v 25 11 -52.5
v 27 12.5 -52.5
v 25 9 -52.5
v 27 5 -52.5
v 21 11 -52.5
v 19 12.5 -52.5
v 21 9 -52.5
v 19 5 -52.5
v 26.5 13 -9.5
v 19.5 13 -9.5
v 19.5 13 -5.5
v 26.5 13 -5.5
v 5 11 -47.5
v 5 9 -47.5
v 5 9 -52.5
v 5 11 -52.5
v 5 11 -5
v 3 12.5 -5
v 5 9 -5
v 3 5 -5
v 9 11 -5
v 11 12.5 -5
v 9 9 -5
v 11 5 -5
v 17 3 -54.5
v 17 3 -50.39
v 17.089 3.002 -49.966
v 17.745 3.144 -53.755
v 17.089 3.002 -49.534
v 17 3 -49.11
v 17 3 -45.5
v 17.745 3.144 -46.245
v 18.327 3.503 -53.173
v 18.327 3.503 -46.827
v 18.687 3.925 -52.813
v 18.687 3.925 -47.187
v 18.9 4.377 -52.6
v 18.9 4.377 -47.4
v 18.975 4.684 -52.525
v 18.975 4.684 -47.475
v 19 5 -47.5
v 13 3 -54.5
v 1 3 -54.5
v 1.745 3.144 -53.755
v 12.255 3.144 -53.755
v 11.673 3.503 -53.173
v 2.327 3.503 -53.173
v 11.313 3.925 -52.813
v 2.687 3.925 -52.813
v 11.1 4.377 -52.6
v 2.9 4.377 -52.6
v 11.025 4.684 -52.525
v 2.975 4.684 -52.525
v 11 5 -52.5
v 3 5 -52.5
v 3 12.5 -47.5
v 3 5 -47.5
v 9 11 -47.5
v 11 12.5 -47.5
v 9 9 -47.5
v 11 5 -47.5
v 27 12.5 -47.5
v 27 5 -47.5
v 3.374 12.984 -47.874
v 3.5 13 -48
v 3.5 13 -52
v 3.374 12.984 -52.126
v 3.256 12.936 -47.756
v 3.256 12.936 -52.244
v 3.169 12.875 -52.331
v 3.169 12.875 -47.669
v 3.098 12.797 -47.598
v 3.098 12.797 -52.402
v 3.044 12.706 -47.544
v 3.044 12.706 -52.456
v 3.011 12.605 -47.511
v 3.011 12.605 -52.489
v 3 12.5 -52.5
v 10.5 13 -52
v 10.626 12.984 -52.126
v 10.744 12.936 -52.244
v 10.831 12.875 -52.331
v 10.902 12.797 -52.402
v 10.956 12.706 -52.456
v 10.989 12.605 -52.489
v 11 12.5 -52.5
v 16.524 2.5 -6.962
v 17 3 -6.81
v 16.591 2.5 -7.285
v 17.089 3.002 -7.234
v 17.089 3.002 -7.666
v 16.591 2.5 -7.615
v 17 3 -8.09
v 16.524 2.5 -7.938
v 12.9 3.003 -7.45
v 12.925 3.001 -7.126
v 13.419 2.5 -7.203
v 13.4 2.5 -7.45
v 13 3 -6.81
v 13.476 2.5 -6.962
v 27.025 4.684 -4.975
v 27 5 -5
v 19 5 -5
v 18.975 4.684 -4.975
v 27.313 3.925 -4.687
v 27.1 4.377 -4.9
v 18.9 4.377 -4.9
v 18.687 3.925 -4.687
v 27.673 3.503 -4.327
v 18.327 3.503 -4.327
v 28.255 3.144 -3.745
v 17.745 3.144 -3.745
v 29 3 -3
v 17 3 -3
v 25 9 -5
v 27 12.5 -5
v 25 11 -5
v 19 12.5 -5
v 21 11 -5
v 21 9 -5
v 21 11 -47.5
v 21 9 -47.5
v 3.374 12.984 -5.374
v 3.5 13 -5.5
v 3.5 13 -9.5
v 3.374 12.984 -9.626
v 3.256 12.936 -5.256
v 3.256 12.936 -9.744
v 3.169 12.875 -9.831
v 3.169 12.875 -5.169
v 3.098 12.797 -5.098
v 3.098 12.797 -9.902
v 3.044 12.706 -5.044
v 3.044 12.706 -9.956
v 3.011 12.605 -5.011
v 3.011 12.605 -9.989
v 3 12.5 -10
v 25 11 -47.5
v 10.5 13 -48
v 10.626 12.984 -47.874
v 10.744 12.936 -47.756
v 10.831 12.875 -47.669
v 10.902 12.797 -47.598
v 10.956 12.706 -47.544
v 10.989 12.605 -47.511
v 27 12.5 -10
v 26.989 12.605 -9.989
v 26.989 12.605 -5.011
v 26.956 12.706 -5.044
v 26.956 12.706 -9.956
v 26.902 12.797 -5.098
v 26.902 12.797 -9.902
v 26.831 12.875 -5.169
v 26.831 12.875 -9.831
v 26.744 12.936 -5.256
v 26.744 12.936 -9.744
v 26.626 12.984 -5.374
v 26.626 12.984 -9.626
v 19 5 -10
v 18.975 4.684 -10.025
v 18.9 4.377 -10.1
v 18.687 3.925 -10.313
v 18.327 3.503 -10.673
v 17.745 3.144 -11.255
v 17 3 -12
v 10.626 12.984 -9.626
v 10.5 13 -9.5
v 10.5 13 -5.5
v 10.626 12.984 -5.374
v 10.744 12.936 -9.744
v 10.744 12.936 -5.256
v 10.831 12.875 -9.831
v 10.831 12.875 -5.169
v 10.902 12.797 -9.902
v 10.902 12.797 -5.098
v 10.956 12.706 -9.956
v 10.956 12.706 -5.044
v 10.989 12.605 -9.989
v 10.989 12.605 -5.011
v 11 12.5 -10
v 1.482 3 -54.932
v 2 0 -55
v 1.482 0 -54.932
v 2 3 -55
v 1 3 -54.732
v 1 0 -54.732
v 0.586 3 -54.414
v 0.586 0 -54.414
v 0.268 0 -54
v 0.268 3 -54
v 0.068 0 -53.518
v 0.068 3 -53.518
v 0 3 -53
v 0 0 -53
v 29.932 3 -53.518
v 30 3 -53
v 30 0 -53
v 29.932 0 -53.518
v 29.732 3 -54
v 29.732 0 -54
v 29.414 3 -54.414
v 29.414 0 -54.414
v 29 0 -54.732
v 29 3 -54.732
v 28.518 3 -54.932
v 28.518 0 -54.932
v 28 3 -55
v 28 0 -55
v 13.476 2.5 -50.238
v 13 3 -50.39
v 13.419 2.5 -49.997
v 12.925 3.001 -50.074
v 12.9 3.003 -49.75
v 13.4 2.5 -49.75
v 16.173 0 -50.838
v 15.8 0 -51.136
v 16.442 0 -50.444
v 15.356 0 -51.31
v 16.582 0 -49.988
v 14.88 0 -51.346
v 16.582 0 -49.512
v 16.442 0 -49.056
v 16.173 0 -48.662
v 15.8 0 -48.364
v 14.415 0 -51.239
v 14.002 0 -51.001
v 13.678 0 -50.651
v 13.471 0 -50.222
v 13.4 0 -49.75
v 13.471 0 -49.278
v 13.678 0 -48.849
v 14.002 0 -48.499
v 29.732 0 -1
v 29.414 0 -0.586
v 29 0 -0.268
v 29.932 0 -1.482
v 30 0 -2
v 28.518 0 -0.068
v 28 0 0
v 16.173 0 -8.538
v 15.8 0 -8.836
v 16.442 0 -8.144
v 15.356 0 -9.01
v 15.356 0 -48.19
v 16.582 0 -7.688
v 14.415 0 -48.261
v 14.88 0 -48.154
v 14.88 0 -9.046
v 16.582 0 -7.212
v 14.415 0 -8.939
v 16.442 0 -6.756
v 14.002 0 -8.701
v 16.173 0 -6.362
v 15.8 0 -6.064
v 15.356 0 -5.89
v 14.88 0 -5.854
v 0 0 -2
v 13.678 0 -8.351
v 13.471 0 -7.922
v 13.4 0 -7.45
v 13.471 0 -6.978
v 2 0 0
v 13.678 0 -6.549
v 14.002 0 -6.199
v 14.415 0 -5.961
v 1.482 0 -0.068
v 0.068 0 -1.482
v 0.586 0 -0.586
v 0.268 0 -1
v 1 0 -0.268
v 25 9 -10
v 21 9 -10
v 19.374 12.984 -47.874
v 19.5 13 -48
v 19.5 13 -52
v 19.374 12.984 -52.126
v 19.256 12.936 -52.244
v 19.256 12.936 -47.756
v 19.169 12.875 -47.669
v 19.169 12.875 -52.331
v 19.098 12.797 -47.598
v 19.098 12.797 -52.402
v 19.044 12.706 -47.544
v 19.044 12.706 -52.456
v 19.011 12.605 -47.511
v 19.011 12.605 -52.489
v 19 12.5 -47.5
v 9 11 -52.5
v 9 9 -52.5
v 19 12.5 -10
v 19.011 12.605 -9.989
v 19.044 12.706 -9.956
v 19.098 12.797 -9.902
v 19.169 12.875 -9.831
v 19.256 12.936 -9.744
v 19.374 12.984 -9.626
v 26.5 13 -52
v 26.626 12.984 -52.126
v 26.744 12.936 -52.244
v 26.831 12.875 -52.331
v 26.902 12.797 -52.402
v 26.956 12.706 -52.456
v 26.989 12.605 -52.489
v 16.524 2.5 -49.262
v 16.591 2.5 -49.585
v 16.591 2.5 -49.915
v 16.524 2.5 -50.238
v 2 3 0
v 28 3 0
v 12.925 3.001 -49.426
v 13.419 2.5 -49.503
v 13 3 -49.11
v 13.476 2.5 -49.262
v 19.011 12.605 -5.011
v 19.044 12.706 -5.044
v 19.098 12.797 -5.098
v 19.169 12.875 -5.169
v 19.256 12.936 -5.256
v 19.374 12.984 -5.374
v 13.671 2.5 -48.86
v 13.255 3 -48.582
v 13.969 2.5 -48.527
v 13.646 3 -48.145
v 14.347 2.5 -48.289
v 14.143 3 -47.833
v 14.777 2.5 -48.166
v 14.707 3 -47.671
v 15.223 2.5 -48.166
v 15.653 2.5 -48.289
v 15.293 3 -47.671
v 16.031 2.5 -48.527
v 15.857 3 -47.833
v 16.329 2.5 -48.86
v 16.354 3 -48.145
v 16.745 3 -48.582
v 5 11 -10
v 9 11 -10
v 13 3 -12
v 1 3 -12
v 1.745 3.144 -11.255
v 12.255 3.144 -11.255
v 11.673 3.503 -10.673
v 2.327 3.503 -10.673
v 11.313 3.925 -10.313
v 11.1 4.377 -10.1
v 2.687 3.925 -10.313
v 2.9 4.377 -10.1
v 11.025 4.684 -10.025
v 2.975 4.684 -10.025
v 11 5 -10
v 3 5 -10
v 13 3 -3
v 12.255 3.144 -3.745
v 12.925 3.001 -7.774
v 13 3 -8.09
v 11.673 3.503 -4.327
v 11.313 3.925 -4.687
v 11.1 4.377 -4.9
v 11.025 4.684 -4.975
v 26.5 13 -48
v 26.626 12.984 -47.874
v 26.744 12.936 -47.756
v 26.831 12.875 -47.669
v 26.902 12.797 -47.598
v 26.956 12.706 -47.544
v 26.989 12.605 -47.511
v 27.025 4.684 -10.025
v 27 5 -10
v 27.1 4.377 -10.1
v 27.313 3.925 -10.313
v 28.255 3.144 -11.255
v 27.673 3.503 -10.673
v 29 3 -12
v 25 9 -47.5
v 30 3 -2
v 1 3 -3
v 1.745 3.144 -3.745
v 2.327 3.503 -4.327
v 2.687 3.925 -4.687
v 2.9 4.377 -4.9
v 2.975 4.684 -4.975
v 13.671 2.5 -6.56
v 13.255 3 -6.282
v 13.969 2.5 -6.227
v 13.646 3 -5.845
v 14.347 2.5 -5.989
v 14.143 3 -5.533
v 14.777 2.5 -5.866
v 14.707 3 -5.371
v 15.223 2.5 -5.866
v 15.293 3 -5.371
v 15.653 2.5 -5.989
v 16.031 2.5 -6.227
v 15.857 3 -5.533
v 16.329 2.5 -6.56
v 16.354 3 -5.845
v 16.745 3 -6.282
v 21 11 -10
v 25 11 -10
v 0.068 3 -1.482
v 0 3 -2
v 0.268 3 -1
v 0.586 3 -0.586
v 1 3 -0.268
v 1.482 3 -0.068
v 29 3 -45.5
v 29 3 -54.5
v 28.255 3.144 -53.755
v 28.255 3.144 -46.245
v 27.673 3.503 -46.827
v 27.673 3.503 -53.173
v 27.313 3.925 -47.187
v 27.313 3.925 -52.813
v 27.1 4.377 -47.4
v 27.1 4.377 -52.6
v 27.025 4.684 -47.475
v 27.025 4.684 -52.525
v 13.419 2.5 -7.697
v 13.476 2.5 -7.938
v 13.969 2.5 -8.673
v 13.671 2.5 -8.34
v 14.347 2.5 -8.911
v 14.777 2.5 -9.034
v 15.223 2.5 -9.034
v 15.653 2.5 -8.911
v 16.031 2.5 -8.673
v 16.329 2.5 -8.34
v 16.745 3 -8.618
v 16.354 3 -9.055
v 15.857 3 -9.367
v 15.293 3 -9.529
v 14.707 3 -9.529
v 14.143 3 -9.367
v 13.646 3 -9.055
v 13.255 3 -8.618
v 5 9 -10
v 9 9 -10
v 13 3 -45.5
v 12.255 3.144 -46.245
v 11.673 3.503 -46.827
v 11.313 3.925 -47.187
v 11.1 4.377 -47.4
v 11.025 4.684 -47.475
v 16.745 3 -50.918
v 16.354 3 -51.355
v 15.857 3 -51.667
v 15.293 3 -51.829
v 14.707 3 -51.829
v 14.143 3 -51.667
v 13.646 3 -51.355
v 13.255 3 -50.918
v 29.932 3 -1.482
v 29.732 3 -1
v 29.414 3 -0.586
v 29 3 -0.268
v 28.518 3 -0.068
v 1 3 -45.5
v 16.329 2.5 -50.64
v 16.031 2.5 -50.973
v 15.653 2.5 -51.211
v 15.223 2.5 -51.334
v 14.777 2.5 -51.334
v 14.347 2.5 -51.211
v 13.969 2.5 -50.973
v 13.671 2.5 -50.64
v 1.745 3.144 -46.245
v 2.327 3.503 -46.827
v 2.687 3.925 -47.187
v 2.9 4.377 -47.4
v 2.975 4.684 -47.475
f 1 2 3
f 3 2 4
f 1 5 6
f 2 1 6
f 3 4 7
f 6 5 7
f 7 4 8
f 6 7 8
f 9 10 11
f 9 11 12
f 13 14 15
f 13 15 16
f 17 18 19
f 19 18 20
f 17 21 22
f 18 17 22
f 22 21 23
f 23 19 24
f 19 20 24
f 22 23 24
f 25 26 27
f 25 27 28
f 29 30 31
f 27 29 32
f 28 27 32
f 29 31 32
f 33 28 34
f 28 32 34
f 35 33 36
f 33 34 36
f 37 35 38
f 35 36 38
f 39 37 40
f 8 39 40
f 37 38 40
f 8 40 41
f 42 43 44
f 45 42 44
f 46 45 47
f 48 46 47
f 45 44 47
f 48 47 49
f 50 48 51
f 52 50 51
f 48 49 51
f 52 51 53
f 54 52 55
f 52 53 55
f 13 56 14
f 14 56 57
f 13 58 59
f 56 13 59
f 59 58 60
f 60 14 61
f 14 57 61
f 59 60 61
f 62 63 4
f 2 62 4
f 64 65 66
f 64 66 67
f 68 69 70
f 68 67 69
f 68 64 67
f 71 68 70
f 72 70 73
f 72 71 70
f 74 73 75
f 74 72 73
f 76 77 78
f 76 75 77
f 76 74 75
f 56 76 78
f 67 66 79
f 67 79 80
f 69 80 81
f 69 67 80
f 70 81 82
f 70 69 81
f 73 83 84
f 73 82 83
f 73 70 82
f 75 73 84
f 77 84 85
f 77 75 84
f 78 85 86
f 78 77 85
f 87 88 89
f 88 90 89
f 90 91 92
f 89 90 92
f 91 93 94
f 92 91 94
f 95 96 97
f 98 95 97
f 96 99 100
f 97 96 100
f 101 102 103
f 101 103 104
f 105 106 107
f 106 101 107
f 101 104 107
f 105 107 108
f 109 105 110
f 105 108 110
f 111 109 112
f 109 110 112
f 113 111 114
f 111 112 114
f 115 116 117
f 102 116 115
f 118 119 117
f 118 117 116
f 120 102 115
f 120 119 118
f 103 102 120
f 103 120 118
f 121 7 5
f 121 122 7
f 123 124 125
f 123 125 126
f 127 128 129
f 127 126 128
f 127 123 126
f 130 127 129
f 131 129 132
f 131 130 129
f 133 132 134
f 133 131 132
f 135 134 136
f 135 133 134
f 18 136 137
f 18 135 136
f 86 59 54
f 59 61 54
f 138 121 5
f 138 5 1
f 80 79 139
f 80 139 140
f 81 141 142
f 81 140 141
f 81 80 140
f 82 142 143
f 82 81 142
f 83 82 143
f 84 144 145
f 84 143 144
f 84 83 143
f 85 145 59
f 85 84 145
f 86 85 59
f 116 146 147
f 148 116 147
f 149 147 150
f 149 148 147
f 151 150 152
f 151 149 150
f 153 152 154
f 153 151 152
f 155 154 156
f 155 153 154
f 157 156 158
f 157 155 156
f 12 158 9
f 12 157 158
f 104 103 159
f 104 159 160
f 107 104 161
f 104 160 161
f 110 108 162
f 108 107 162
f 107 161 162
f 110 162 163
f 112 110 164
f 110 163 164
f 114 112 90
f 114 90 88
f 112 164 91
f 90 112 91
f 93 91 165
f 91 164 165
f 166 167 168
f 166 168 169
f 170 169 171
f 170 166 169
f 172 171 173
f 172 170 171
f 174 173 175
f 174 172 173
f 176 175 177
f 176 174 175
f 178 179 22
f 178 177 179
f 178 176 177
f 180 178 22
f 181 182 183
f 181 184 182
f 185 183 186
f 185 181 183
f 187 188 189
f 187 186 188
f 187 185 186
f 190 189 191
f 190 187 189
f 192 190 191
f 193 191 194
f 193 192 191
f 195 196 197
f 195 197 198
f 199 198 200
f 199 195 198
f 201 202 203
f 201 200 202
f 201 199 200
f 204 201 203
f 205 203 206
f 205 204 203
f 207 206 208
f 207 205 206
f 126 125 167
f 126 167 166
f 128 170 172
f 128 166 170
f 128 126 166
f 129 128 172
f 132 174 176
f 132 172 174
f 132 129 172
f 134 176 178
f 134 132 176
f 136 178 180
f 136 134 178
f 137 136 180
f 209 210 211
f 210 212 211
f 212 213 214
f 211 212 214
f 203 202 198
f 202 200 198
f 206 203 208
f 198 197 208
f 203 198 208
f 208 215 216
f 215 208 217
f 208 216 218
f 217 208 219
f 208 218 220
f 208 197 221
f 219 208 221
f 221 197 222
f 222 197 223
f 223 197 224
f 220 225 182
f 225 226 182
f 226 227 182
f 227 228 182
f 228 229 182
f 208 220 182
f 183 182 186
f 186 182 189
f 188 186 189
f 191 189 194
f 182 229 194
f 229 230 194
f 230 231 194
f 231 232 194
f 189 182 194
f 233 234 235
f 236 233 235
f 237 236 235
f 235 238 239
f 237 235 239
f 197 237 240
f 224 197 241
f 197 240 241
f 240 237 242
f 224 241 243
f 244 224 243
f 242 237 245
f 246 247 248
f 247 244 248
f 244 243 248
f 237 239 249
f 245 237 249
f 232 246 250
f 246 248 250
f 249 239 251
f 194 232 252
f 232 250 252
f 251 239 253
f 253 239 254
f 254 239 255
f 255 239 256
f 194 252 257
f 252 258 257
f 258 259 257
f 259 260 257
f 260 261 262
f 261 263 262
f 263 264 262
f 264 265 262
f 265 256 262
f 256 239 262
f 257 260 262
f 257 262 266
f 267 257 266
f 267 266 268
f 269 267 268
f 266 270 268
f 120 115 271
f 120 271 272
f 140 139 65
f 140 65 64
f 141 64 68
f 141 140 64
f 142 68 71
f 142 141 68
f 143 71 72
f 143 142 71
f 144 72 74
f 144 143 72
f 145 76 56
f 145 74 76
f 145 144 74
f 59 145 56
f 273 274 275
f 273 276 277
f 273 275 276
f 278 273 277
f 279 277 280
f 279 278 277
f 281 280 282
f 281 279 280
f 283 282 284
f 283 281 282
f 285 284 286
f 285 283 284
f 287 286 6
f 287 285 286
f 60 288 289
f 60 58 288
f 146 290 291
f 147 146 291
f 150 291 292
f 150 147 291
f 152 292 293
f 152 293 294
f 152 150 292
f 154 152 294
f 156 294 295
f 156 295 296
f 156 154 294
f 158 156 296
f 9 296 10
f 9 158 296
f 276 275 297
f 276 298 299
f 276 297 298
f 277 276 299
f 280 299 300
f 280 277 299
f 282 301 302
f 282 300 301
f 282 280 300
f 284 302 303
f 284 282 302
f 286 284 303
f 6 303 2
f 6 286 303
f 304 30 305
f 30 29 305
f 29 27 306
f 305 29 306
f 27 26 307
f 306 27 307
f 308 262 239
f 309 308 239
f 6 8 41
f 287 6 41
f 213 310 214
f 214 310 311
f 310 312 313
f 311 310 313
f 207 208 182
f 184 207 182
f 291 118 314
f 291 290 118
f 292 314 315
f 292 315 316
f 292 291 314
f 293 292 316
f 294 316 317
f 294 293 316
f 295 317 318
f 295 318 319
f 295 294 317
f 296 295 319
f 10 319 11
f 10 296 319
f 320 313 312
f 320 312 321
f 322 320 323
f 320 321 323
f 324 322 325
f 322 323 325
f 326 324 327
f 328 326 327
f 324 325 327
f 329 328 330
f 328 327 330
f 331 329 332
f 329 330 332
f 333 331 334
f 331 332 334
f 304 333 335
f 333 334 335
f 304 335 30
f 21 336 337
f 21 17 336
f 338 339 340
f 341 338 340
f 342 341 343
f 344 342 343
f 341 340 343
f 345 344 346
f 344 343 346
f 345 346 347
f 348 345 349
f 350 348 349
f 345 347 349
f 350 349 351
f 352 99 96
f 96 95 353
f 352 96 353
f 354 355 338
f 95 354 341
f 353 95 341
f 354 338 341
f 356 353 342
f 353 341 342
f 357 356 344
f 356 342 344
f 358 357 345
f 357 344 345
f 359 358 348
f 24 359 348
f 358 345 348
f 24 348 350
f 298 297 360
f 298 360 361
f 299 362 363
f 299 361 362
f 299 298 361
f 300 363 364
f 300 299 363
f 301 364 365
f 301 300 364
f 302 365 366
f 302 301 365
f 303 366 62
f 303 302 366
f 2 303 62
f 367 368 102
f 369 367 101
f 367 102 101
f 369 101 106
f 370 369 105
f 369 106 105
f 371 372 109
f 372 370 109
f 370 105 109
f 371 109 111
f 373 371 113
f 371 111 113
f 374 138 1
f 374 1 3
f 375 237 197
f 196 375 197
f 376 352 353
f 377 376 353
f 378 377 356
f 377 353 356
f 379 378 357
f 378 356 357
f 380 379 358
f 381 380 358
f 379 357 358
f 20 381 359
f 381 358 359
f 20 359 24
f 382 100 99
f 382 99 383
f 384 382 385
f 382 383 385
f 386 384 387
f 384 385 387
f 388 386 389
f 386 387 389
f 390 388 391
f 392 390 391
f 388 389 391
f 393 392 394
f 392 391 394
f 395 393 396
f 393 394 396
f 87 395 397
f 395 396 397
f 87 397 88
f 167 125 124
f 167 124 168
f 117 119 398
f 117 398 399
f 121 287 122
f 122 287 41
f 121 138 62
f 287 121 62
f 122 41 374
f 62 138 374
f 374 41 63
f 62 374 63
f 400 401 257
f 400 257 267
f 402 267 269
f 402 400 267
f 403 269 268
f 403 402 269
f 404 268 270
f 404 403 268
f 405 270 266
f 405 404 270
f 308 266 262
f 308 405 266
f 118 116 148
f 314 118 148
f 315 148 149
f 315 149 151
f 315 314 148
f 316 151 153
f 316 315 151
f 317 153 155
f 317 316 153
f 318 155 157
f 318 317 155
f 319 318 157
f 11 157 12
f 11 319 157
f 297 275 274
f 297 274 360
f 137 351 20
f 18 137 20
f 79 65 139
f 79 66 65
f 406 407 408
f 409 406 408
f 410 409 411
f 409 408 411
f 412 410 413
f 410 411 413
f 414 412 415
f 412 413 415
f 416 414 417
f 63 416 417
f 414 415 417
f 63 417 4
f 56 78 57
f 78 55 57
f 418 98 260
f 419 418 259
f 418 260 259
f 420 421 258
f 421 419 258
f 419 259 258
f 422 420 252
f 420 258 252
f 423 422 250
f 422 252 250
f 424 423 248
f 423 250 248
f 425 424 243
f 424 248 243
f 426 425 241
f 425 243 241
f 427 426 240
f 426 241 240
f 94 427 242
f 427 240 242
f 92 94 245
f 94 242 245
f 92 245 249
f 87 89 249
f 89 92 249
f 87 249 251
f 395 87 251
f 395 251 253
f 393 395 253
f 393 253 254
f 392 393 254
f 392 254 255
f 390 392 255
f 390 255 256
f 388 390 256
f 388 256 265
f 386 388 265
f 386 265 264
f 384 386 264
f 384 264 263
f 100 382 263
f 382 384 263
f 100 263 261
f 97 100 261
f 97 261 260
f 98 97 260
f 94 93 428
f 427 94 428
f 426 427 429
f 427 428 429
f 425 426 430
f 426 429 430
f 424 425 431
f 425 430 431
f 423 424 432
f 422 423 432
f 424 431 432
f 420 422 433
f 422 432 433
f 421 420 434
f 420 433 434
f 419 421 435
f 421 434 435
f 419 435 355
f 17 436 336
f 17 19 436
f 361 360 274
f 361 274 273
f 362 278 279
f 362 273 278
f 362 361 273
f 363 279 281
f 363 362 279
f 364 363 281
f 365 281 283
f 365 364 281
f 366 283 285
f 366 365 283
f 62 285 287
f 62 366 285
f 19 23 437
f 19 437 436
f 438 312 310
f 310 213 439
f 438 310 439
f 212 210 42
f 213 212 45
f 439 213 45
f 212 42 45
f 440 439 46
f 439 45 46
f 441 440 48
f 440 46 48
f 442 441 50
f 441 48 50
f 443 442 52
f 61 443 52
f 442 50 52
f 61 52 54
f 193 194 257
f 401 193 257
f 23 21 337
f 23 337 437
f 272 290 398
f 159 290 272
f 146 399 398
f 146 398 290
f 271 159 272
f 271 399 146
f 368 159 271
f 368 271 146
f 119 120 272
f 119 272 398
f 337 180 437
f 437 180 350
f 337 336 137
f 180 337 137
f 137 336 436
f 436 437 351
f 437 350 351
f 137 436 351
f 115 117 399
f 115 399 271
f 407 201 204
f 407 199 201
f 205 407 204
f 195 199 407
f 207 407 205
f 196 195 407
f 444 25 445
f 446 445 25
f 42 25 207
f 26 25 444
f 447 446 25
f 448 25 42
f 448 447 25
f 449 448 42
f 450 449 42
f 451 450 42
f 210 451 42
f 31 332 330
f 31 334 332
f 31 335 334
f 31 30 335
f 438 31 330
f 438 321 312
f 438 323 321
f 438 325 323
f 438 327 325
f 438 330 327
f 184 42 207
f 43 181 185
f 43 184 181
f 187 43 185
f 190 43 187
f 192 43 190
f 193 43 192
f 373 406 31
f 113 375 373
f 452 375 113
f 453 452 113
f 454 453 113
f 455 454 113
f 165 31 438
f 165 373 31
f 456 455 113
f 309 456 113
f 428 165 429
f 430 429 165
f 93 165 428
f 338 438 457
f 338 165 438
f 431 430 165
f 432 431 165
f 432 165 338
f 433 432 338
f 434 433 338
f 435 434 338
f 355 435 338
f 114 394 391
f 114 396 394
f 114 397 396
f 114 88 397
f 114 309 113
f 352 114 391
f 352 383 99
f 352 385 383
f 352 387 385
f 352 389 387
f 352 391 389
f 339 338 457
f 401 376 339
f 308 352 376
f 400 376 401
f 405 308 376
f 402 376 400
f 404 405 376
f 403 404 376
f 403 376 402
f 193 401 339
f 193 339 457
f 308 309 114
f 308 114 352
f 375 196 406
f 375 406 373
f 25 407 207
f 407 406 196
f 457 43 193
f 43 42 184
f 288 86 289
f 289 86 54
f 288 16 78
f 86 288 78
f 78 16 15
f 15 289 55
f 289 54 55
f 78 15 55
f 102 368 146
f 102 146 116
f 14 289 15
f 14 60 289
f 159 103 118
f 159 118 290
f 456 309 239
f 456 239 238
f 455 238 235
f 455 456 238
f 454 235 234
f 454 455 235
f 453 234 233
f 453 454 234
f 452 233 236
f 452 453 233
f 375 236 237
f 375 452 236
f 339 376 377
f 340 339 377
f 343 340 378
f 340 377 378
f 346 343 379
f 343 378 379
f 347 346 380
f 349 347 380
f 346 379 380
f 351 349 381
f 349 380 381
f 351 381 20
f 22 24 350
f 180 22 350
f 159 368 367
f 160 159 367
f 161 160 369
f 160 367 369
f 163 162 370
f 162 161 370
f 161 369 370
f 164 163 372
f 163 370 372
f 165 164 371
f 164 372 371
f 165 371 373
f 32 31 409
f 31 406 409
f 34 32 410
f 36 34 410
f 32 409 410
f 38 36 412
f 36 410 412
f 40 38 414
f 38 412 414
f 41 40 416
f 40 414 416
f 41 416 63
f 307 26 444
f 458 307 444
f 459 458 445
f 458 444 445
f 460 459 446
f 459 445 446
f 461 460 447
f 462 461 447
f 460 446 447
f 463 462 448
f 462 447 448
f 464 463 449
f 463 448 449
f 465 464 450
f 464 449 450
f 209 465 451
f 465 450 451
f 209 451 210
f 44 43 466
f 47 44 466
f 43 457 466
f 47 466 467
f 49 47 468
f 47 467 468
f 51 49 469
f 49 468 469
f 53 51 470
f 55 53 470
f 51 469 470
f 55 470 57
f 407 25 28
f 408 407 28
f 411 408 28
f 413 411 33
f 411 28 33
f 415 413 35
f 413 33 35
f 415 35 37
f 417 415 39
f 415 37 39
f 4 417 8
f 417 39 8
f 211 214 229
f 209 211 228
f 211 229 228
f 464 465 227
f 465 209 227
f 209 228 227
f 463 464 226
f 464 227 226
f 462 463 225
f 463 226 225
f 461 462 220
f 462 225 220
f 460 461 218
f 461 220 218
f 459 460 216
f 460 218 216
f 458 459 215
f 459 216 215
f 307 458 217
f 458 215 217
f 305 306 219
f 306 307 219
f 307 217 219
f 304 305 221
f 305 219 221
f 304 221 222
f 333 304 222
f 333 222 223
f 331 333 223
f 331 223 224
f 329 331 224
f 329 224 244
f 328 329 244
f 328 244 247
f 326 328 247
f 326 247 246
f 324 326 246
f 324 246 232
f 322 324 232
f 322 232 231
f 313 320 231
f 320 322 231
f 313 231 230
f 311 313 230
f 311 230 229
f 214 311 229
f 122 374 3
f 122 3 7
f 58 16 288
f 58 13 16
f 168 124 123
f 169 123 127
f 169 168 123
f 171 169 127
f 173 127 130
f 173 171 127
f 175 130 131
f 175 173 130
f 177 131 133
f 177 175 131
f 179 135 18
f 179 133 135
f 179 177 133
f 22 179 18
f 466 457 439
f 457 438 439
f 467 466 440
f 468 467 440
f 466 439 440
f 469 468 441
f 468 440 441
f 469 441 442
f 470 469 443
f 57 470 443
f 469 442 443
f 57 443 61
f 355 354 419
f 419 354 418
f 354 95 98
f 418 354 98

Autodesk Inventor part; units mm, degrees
ref_plane "YZ Plane" through (0, 0, 0) normal (1, 0, 0) x (0, 1, 0)
ref_plane "XZ Plane" through (0, 0, 0) normal (0, 1, 0) x (-1, 0, 0)
ref_plane "XY Plane" through (0, 0, 0) normal (0, 0, 1) x (1, 0, 0)
sketch "Náčrt1" plane through (0, 0, 0) normal (0, 1, 0) x (-1, 0, 0)
  line L0 (0, 0) -> (-30, 0)
  line L1 (-30, 0) -> (-30, -55)
  line L2 (-30, -55) -> (0, -55)
  line L3 (0, -55) -> (0, 0)
  circle A0 centre (-15, -7.45) radius 1.6
  circle A1 centre (-15, -49.75) radius 1.6
  dimension "d1" = 3.2
  dimension "d2" = 3.2
  dimension "d3" = 55
  dimension "d4" = 30
  dimension "d5" = 15
  dimension "d6" = 15
  dimension "d11" = 5.25
  dimension "d12" = 7.45
extrude "Vysunutí1" add sketch "Náčrt1" along normal blind 3
sketch "Náčrt2" plane through (0, 3, 0) normal (0, 1, 0) x (1, 0, 0)
  line L0 (3, 5) -> (11, 5)
  line L1 (11, 5) -> (11, 10)
  line L2 (11, 10) -> (3, 10)
  line L3 (3, 10) -> (3, 5)
  line L4 (27, 5) -> (19, 5)
  line L5 (19, 5) -> (19, 10)
  line L6 (19, 10) -> (27, 10)
  line L7 (27, 10) -> (27, 5)
  line L8 (0, 55) -> (0, 0) projected
  line L9 (0, 0) -> (30, 0) projected
  line L10 (30, 0) -> (30, 55) projected
  line L11 (-2.5391, 27.5) -> (32.8549, 27.5) construction
  line L12 (3, 47.5) -> (11, 47.5)
  line L13 (11, 47.5) -> (11, 52.5)
  line L14 (11, 52.5) -> (3, 52.5)
  line L15 (3, 52.5) -> (3, 47.5)
  line L16 (19, 47.5) -> (27, 47.5)
  line L17 (27, 47.5) -> (27, 52.5)
  line L18 (27, 52.5) -> (19, 52.5)
  line L19 (19, 52.5) -> (19, 47.5)
  line L20 (30, 55) -> (0, 55) projected
  dimension "d15" = 3
  dimension "d16" = 8
  dimension "d17" = 5
  dimension "d18" = 5
  dimension "d19" = 5
  dimension "d20" = 3
  dimension "d21" = 8
  dimension "d22" = 5
  dimension "d23" = 5
  dimension "d24" = 8
  dimension "d25" = 2.5
  dimension "d26" = 2.5
  dimension "d27" = 8
  dimension "d28" = 5
  dimension "d29" = 3
  dimension "d30" = 3
extrude "Vysunutí2" add sketch "Náčrt2" along normal blind 10 contours L3 L2 L1 L0 | L4 L5 L6 L7 | L15 L14 L13 L12 | L19 L18 L17 L16
fillet "Zaoblení1" radius 2 20 edges at (7, 3, -10) (23, 3, -10) (7, 3, -47.5) (23, 3, -47.5) (27, 3, -50) (23, 3, -52.5) (19, 3, -50) (11, 3, -50) (7, 3, -52.5) (3, 3, -50) (3, 3, -7.5) (7, 3, -5) (19, 3, -7.5) (23, 3, -5) (11, 3, -7.5) (27, 3, -7.5) (30, 1.5, 0) (0, 1.5, 0) (30, 1.5, -55) (0, 1.5, -55)
sketch "Náčrt3" plane through (3, 13, -5) normal (0, 0, 1) x (1, 0, 0)
  line L0 (2, -2) -> (6, -2)
  line L1 (6, -2) -> (6, -4)
  line L2 (6, -4) -> (2, -4)
  line L3 (2, -4) -> (2, -2)
  line L4 (18, -2) -> (22, -2)
  line L5 (22, -2) -> (22, -4)
  line L6 (22, -4) -> (18, -4)
  line L7 (18, -4) -> (18, -2)
  line L8 (0, -8) -> (0, 0) projected
  line L9 (0, 0) -> (8, 0) projected
  line L10 (24, -8) -> (24, 0) projected
  point P0 (-3, -13)
  dimension "d34" = 4
  dimension "d35" = 2
  dimension "d36" = 2
  dimension "d37" = 2
  dimension "d38" = 4
  dimension "d39" = 2
  dimension "d40" = 2
extrude "Vysunutí3" cut sketch "Náčrt3" against normal blind 50
fillet "Zaoblení2" radius 0.5 16 edges at (3, 13, -7.5) (7, 13, -5) (11, 13, -7.5) (7, 13, -10) (23, 13, -5) (19, 13, -7.5) (23, 13, -10) (27, 13, -7.5) (3, 13, -50) (7, 13, -52.5) (7, 13, -47.5) (11, 13, -50) (19, 13, -50) (23, 13, -52.5) (23, 13, -47.5) (27, 13, -50)
chamfer "Zkosení1" distance 0.5 angle 45 2 edges at (16.6, 3, -7.45) (16.6, 3, -49.75)
properties part number "CableHolderMain"
